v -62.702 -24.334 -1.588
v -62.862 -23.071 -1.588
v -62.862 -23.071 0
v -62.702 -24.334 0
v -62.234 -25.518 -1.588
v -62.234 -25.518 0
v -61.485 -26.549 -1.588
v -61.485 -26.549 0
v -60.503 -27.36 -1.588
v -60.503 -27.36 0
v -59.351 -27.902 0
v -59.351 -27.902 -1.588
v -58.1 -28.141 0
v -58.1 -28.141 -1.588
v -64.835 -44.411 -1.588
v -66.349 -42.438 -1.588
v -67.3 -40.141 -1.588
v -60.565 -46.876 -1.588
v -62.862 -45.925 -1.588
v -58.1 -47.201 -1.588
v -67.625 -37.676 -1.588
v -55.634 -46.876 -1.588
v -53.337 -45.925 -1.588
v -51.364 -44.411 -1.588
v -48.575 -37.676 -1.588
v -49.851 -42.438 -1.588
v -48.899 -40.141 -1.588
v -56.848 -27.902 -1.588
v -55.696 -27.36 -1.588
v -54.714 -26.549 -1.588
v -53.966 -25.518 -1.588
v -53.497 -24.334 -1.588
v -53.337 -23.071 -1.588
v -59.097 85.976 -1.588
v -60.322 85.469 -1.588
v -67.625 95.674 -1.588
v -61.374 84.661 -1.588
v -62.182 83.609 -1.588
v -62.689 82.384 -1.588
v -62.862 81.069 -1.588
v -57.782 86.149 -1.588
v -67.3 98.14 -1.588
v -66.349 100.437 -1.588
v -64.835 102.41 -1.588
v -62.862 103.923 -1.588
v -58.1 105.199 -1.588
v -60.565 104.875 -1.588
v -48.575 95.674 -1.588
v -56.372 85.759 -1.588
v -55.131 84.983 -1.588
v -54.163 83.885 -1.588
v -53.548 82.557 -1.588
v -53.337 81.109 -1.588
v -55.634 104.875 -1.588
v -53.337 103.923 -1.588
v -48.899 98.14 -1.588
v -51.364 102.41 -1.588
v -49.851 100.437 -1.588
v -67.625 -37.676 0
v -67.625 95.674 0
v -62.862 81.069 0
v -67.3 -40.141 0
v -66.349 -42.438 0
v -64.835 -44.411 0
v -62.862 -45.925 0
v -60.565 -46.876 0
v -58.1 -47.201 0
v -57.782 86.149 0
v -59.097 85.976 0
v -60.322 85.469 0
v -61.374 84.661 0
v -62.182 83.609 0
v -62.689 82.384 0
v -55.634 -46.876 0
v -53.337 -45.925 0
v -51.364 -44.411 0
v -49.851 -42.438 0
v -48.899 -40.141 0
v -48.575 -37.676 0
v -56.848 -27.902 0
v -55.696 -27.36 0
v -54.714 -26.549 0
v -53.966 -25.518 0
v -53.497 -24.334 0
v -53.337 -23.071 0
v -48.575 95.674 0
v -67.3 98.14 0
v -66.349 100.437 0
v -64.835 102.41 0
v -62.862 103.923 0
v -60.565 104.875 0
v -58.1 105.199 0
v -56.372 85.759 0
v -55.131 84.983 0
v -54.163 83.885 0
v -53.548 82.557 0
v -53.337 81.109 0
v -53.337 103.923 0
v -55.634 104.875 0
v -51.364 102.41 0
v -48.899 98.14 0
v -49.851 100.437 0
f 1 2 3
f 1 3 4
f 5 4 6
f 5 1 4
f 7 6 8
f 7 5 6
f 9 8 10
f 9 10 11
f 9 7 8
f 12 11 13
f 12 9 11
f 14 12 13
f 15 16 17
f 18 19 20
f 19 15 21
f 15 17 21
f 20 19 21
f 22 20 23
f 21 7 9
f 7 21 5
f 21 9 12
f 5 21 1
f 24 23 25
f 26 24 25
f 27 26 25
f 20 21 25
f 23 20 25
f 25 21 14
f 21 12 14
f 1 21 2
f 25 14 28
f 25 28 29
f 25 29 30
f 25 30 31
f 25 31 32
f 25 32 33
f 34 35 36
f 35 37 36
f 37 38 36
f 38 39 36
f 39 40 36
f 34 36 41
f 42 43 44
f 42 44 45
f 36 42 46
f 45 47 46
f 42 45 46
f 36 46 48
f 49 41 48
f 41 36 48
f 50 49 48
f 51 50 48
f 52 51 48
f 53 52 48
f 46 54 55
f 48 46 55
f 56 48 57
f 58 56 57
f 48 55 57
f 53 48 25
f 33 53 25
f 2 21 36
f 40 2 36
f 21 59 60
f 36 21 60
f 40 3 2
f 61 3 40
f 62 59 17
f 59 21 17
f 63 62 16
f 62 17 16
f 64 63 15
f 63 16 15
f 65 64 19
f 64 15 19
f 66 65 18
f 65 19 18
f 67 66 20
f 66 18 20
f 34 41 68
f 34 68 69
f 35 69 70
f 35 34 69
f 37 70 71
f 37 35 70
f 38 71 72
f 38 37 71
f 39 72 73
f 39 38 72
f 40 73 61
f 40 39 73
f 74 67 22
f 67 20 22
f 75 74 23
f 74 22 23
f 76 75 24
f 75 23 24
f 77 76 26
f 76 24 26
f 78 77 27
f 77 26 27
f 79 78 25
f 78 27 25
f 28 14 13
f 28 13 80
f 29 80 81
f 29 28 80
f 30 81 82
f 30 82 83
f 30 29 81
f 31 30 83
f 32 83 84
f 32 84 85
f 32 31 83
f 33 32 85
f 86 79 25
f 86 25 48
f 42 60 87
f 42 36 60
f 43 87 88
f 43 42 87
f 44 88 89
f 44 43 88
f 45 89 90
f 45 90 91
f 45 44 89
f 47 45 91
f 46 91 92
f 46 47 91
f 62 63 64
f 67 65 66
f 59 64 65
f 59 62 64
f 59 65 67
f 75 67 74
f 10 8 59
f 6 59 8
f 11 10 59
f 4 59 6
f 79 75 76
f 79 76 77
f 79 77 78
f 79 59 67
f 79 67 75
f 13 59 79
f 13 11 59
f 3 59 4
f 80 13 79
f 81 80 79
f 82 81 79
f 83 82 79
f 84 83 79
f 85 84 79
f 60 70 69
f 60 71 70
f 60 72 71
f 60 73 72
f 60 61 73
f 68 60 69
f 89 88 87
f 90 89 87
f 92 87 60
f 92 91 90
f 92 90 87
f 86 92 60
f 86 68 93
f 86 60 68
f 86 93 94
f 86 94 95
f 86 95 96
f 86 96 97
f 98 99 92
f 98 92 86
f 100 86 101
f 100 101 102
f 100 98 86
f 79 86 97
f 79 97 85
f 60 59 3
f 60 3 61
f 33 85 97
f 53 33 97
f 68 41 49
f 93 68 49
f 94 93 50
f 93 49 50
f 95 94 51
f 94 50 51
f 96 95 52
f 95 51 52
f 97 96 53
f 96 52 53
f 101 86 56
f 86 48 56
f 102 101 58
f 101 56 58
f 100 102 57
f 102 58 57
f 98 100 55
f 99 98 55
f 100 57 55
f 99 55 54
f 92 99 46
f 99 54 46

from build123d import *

# Parameters (mm, degrees)
F0_W        = 19.05
F0_H        = 152.4
F1_DEPTH    = 1.5875
F2_R        = 9.52499
F4_W        = 9.525
F4_H        = 114.3
F5_DEPTH    = 25.4
F6_T1_DEPTH = 1.5875
F7_T1_DEPTH = 1.5875


# Not quite as in the source:
# - a fillet or chamfer that OpenCascade refuses, or shapes differently, is made with other operations: its cross-section is extruded or revolved along the edge and cut away or added
# - a fillet or chamfer is up to 0.001 mm smaller than in the source, because OpenCascade refuses the exact size


with BuildPart() as f1:
    # F0 (on Top) → F1 (new body)
    with BuildSketch(Plane.XY):
        with Locations((-58.0996136427, 28.9993500233)):
            Rectangle(F0_W, F0_H)
    extrude(amount=-F1_DEPTH)

    # F2 (radius 9.525 in the source; OpenCascade refuses exactly that, so slightly less here)
    f2_edges = [f1.edges().sort_by_distance(p)[0] for p in [
        (-48.574614, -47.20065, -0.79375),
        (-67.624614, -47.20065, -0.79375),
        (-48.574614, 105.19935, -0.79375),
        (-67.624614, 105.19935, -0.79375),
    ]]
    fillet(f2_edges, radius=F2_R)

    # F4 (on offset) → F5 (cut)
    with BuildSketch(Plane.XY):
        with Locations((-58.0996136427, 28.9993500233)):
            Rectangle(F4_W, F4_H)
    extrude(amount=-F5_DEPTH, mode=Mode.SUBTRACT)

    # F6: fillet of radius 5.08 on 3 edges, made by hand

    # F6_s2 → F6_t1 (join)
    with BuildSketch(Plane.XY.offset(-1.5875)):
        with BuildLine():
            ThreePointArc((-62.8621136427, -23.0706499767), (-61.3742160911, -26.6627524252), (-57.7821136427, -28.1506499767))
            Line((-57.7821136427, -28.1506499767), (-62.8621136427, -28.1506499767))
            Line((-62.8621136427, -28.1506499767), (-62.8621136427, -23.0706499767))
        make_face()
        with BuildLine():
            ThreePointArc((-57.7821136427, 86.1493500233), (-61.3742160911, 84.6614524717), (-62.8621136427, 81.0693500233))
            Line((-62.8621136427, 81.0693500233), (-62.8621136427, 86.1493500233))
            Line((-62.8621136427, 86.1493500233), (-57.7821136427, 86.1493500233))
        make_face()
        with BuildLine():
            ThreePointArc((-58.4171136427, -28.1506499767), (-54.8250111943, -26.6627524252), (-53.3371136427, -23.0706499767))
            Line((-53.3371136427, -23.0706499767), (-53.3371136427, -28.1506499767))
            Line((-53.3371136427, -28.1506499767), (-58.4171136427, -28.1506499767))
        make_face()
    extrude(amount=F6_T1_DEPTH)

    # F7: fillet of radius 5.08 on 1 edges, made by hand

    # F7_s2 → F7_t1 (join)
    with BuildSketch(Plane.XY.offset(-1.5875)):
        with BuildLine():
            ThreePointArc((-57.7821136427, 86.1493500233), (-54.6071136427, 84.4692979408), (-53.3371136427, 81.1091937757))
            Line((-53.3371136427, 81.1091937757), (-53.3371136427, 86.1493500233))
            Line((-53.3371136427, 86.1493500233), (-57.7821136427, 86.1493500233))
        make_face()
    extrude(amount=F7_T1_DEPTH)


solid = f1.part
